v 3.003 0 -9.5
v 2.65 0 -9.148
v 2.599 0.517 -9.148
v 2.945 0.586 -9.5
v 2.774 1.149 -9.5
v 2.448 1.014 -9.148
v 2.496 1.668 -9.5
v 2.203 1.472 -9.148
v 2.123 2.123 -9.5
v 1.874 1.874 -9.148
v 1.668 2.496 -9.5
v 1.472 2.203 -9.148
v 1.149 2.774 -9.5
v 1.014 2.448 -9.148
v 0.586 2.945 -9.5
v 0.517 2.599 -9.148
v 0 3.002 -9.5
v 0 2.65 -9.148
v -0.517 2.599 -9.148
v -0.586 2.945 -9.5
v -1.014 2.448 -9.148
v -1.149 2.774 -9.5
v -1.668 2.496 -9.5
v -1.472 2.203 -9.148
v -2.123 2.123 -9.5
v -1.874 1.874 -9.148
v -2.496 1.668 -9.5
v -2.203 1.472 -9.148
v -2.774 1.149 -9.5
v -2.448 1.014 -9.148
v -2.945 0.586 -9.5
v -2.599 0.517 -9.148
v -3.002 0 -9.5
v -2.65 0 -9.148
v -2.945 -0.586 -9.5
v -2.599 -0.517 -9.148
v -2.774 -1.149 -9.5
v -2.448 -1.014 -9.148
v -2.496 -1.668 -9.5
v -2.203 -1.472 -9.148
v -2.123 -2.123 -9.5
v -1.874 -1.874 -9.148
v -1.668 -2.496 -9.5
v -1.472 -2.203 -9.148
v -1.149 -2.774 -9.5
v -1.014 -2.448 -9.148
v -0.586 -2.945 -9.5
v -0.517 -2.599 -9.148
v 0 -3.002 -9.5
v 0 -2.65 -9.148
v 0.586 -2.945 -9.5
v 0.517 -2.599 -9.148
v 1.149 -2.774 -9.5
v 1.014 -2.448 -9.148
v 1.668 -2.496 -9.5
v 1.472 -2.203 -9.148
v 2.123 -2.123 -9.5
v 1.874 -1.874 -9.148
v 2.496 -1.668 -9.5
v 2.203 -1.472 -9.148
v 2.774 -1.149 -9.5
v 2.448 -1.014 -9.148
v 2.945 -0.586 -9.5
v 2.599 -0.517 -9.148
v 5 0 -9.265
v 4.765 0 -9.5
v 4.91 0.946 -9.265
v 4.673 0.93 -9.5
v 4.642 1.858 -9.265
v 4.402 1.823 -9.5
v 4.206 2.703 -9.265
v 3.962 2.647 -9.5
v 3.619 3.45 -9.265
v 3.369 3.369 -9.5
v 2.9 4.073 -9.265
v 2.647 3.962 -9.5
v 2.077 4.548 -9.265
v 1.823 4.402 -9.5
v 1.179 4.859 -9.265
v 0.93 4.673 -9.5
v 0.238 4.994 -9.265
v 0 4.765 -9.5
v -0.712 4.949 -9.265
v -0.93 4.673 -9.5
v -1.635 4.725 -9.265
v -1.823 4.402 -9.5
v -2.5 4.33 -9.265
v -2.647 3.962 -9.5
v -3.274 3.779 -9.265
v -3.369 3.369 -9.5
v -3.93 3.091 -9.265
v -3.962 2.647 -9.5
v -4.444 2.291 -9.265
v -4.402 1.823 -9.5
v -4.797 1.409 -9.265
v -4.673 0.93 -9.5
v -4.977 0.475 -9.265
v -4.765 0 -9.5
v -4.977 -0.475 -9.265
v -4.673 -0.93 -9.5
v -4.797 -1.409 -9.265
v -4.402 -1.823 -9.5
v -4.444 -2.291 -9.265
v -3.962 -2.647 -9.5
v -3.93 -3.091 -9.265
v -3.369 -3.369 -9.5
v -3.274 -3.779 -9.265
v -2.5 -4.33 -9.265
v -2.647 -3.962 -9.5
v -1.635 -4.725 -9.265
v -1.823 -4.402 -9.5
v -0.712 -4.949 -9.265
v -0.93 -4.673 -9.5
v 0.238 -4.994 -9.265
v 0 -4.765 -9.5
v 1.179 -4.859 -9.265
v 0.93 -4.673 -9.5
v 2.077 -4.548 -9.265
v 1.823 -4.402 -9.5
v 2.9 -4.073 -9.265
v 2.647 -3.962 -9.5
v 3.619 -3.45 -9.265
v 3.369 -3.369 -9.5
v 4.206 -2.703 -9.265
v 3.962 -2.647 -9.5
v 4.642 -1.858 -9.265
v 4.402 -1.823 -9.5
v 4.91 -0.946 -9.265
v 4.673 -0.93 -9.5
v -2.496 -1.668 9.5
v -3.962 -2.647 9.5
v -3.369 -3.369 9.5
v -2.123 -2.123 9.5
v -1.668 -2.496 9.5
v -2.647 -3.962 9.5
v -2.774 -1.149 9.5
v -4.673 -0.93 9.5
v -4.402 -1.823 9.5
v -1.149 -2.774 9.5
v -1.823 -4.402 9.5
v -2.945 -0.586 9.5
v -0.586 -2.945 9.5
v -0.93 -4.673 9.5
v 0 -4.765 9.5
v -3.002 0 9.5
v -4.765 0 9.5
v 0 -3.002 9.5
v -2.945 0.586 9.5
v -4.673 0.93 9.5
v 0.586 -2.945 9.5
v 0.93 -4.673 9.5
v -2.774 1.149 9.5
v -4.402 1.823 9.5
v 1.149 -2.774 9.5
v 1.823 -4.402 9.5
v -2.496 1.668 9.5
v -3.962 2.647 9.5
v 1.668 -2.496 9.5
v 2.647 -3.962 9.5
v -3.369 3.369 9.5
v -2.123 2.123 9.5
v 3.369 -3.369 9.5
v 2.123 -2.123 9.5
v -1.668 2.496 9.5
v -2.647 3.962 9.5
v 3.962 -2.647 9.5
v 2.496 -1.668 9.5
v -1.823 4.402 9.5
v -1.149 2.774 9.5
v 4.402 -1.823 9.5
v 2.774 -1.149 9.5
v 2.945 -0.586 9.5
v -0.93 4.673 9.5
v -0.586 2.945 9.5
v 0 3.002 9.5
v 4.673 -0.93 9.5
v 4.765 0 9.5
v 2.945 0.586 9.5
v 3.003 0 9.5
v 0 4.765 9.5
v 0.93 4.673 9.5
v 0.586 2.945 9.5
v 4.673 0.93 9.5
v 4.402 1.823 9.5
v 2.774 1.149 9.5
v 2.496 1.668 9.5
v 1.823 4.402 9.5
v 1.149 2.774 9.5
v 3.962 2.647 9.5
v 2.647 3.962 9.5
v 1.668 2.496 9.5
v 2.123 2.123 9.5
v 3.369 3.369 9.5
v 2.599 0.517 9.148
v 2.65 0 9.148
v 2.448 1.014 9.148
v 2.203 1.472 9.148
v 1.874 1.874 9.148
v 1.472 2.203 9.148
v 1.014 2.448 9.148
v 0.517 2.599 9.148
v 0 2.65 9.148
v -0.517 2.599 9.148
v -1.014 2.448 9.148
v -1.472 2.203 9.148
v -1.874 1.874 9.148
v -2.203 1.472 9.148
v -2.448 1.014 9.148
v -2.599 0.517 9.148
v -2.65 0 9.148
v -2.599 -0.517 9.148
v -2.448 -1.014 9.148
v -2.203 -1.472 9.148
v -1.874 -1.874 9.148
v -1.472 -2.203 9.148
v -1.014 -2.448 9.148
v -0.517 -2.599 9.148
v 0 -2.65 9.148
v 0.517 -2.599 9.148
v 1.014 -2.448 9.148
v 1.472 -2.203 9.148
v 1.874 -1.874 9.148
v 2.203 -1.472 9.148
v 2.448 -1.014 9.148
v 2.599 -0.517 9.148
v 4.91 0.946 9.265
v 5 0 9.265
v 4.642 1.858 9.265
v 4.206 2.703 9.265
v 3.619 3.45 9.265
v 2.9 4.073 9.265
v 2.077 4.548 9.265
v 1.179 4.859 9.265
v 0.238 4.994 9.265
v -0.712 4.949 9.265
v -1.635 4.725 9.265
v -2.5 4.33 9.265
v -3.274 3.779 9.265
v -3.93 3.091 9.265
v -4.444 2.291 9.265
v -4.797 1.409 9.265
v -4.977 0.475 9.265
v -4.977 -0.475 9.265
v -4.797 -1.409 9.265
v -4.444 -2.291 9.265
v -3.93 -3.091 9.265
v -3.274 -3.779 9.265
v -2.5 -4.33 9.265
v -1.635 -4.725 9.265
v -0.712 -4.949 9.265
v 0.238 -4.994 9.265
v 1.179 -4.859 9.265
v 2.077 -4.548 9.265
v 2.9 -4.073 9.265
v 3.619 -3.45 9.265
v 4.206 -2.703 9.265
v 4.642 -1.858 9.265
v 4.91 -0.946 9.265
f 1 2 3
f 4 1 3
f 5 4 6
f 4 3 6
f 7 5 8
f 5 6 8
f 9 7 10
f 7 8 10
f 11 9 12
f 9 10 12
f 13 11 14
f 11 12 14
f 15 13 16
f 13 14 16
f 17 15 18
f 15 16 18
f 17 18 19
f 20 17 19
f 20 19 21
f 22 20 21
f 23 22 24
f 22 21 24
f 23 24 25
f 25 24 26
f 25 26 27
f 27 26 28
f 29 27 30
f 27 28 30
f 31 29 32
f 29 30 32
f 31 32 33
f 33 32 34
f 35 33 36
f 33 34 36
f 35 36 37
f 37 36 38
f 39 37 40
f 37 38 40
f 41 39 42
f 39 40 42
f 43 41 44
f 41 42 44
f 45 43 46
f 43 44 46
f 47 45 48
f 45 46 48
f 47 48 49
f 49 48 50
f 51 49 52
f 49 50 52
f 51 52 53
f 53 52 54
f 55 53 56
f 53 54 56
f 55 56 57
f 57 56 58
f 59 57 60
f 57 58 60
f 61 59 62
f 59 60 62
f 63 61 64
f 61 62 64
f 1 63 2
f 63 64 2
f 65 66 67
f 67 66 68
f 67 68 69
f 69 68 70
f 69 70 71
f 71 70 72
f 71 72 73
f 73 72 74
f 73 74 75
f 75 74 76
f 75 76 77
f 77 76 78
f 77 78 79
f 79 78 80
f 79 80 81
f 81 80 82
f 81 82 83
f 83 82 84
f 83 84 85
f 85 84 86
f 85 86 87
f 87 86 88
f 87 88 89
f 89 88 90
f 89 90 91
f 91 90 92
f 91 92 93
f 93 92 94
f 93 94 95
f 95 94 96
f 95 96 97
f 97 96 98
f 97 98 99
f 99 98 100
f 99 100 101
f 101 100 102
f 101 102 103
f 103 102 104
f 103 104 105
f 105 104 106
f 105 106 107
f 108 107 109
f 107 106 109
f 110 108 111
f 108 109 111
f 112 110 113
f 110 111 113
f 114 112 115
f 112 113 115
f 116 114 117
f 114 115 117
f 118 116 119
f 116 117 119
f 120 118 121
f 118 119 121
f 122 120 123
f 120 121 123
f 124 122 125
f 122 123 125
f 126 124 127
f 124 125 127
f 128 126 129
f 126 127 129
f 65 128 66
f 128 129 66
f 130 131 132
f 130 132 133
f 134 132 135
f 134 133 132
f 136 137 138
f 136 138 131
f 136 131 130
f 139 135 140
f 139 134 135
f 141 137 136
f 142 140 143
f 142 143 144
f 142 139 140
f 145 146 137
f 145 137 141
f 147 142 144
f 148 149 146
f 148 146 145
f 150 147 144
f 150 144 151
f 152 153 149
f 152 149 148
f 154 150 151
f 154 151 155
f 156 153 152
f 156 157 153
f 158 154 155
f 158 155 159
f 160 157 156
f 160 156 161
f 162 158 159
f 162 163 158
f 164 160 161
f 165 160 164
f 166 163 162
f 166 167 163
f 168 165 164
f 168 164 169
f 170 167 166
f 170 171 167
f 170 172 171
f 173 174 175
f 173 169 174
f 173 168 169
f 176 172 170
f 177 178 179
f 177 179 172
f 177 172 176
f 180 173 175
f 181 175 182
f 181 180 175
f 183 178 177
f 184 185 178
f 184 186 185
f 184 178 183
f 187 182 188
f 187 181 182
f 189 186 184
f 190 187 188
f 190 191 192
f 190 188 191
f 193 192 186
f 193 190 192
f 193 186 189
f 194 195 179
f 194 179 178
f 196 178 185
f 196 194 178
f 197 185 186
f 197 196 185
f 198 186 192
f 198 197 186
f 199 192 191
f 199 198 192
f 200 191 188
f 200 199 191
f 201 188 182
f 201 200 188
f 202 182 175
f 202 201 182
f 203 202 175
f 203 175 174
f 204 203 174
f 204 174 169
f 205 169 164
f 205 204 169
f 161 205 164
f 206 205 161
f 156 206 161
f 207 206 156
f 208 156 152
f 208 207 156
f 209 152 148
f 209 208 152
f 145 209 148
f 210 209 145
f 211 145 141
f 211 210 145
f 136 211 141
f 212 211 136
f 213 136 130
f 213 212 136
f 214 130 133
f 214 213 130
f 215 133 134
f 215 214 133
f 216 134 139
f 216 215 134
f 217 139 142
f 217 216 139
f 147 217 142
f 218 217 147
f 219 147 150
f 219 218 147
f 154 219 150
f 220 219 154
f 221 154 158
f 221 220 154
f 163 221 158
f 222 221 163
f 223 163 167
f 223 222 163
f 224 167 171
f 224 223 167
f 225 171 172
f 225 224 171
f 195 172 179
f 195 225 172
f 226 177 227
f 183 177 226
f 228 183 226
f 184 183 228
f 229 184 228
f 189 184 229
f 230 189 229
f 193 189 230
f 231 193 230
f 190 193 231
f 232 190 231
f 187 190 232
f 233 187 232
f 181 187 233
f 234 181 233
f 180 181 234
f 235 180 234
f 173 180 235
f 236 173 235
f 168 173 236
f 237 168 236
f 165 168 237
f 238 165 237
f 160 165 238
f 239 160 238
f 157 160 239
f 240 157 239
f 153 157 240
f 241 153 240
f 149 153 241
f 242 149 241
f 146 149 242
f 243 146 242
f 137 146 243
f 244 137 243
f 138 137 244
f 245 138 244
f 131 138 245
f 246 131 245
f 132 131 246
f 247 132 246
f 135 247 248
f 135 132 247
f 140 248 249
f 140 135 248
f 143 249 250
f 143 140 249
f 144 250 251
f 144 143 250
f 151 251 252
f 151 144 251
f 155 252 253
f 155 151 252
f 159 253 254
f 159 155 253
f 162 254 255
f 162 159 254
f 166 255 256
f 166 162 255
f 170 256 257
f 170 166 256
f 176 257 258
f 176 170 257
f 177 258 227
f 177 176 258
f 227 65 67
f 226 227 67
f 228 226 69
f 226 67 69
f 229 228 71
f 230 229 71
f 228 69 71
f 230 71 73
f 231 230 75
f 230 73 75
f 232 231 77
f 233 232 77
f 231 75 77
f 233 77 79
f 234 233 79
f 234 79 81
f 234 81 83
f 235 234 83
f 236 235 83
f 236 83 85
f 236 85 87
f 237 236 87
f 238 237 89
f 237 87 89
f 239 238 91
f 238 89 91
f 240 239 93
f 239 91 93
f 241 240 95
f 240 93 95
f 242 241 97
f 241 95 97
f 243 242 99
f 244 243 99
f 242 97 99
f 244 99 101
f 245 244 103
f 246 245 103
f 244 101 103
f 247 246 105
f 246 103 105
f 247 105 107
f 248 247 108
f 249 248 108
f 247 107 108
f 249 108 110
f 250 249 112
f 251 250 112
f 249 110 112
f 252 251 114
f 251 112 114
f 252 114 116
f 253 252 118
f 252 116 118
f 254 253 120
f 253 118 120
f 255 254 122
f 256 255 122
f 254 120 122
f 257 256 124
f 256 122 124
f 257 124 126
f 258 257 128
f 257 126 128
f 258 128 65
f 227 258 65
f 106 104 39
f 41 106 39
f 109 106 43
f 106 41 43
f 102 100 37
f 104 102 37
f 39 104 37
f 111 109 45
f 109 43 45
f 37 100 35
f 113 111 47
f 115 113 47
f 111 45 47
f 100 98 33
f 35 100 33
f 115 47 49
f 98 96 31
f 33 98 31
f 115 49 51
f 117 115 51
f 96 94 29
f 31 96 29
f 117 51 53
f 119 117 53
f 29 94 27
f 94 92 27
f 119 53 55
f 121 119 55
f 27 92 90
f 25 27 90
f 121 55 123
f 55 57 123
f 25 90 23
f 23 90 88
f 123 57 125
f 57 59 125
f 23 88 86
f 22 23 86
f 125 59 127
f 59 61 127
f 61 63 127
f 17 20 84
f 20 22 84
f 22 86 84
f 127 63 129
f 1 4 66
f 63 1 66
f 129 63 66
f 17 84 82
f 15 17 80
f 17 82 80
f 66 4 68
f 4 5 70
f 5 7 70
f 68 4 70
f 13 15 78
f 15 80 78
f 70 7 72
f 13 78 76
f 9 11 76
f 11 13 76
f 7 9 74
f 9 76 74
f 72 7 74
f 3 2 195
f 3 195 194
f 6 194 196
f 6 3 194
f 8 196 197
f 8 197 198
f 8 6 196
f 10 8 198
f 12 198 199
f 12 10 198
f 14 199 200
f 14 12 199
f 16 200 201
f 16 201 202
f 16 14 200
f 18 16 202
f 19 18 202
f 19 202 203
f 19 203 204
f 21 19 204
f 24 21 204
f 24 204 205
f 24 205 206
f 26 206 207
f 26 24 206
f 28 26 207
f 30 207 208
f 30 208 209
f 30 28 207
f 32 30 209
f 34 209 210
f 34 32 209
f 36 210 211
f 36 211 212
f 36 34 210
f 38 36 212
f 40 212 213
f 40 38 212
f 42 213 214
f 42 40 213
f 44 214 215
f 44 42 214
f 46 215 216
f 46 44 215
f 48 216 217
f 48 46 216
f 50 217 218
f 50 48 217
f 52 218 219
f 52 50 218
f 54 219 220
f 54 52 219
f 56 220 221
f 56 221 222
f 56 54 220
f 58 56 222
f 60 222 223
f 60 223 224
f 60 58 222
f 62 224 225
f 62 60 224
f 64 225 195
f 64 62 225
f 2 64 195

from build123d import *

# Parameters (mm, degrees)
BOSS_EXTRUDE1_DEPTH      = 9.5
BOSS_EXTRUDE1_DEPTH_BACK = 9.5
SKETCH3_R                = 5
SKETCH3_R_2              = 2.65
CHAMFER1_SIZE            = 0.235
CHAMFER2_SIZE            = 0.3525


with BuildPart() as part:
    # Sketch3 → Boss-Extrude1 (new, two sides: drawn at the far end of the back side and taken through both)
    with BuildSketch(Plane.XY.offset(-BOSS_EXTRUDE1_DEPTH_BACK)):
        Circle(SKETCH3_R)
        Circle(SKETCH3_R_2, mode=Mode.SUBTRACT)
    extrude(amount=BOSS_EXTRUDE1_DEPTH + BOSS_EXTRUDE1_DEPTH_BACK)

    # Chamfer1
    chamfer1_edges = [part.edges().sort_by_distance(p)[0] for p in [
        (-5, 0, -9.5),
        (-5, 0, 9.5),
    ]]
    chamfer(chamfer1_edges, length=CHAMFER1_SIZE)

    # Chamfer2
    chamfer2_edges = [part.edges().sort_by_distance(p)[0] for p in [
        (-2.65, 0, -9.5),
        (-2.65, 0, 9.5),
    ]]
    chamfer(chamfer2_edges, length=CHAMFER2_SIZE)


solid = part.part
